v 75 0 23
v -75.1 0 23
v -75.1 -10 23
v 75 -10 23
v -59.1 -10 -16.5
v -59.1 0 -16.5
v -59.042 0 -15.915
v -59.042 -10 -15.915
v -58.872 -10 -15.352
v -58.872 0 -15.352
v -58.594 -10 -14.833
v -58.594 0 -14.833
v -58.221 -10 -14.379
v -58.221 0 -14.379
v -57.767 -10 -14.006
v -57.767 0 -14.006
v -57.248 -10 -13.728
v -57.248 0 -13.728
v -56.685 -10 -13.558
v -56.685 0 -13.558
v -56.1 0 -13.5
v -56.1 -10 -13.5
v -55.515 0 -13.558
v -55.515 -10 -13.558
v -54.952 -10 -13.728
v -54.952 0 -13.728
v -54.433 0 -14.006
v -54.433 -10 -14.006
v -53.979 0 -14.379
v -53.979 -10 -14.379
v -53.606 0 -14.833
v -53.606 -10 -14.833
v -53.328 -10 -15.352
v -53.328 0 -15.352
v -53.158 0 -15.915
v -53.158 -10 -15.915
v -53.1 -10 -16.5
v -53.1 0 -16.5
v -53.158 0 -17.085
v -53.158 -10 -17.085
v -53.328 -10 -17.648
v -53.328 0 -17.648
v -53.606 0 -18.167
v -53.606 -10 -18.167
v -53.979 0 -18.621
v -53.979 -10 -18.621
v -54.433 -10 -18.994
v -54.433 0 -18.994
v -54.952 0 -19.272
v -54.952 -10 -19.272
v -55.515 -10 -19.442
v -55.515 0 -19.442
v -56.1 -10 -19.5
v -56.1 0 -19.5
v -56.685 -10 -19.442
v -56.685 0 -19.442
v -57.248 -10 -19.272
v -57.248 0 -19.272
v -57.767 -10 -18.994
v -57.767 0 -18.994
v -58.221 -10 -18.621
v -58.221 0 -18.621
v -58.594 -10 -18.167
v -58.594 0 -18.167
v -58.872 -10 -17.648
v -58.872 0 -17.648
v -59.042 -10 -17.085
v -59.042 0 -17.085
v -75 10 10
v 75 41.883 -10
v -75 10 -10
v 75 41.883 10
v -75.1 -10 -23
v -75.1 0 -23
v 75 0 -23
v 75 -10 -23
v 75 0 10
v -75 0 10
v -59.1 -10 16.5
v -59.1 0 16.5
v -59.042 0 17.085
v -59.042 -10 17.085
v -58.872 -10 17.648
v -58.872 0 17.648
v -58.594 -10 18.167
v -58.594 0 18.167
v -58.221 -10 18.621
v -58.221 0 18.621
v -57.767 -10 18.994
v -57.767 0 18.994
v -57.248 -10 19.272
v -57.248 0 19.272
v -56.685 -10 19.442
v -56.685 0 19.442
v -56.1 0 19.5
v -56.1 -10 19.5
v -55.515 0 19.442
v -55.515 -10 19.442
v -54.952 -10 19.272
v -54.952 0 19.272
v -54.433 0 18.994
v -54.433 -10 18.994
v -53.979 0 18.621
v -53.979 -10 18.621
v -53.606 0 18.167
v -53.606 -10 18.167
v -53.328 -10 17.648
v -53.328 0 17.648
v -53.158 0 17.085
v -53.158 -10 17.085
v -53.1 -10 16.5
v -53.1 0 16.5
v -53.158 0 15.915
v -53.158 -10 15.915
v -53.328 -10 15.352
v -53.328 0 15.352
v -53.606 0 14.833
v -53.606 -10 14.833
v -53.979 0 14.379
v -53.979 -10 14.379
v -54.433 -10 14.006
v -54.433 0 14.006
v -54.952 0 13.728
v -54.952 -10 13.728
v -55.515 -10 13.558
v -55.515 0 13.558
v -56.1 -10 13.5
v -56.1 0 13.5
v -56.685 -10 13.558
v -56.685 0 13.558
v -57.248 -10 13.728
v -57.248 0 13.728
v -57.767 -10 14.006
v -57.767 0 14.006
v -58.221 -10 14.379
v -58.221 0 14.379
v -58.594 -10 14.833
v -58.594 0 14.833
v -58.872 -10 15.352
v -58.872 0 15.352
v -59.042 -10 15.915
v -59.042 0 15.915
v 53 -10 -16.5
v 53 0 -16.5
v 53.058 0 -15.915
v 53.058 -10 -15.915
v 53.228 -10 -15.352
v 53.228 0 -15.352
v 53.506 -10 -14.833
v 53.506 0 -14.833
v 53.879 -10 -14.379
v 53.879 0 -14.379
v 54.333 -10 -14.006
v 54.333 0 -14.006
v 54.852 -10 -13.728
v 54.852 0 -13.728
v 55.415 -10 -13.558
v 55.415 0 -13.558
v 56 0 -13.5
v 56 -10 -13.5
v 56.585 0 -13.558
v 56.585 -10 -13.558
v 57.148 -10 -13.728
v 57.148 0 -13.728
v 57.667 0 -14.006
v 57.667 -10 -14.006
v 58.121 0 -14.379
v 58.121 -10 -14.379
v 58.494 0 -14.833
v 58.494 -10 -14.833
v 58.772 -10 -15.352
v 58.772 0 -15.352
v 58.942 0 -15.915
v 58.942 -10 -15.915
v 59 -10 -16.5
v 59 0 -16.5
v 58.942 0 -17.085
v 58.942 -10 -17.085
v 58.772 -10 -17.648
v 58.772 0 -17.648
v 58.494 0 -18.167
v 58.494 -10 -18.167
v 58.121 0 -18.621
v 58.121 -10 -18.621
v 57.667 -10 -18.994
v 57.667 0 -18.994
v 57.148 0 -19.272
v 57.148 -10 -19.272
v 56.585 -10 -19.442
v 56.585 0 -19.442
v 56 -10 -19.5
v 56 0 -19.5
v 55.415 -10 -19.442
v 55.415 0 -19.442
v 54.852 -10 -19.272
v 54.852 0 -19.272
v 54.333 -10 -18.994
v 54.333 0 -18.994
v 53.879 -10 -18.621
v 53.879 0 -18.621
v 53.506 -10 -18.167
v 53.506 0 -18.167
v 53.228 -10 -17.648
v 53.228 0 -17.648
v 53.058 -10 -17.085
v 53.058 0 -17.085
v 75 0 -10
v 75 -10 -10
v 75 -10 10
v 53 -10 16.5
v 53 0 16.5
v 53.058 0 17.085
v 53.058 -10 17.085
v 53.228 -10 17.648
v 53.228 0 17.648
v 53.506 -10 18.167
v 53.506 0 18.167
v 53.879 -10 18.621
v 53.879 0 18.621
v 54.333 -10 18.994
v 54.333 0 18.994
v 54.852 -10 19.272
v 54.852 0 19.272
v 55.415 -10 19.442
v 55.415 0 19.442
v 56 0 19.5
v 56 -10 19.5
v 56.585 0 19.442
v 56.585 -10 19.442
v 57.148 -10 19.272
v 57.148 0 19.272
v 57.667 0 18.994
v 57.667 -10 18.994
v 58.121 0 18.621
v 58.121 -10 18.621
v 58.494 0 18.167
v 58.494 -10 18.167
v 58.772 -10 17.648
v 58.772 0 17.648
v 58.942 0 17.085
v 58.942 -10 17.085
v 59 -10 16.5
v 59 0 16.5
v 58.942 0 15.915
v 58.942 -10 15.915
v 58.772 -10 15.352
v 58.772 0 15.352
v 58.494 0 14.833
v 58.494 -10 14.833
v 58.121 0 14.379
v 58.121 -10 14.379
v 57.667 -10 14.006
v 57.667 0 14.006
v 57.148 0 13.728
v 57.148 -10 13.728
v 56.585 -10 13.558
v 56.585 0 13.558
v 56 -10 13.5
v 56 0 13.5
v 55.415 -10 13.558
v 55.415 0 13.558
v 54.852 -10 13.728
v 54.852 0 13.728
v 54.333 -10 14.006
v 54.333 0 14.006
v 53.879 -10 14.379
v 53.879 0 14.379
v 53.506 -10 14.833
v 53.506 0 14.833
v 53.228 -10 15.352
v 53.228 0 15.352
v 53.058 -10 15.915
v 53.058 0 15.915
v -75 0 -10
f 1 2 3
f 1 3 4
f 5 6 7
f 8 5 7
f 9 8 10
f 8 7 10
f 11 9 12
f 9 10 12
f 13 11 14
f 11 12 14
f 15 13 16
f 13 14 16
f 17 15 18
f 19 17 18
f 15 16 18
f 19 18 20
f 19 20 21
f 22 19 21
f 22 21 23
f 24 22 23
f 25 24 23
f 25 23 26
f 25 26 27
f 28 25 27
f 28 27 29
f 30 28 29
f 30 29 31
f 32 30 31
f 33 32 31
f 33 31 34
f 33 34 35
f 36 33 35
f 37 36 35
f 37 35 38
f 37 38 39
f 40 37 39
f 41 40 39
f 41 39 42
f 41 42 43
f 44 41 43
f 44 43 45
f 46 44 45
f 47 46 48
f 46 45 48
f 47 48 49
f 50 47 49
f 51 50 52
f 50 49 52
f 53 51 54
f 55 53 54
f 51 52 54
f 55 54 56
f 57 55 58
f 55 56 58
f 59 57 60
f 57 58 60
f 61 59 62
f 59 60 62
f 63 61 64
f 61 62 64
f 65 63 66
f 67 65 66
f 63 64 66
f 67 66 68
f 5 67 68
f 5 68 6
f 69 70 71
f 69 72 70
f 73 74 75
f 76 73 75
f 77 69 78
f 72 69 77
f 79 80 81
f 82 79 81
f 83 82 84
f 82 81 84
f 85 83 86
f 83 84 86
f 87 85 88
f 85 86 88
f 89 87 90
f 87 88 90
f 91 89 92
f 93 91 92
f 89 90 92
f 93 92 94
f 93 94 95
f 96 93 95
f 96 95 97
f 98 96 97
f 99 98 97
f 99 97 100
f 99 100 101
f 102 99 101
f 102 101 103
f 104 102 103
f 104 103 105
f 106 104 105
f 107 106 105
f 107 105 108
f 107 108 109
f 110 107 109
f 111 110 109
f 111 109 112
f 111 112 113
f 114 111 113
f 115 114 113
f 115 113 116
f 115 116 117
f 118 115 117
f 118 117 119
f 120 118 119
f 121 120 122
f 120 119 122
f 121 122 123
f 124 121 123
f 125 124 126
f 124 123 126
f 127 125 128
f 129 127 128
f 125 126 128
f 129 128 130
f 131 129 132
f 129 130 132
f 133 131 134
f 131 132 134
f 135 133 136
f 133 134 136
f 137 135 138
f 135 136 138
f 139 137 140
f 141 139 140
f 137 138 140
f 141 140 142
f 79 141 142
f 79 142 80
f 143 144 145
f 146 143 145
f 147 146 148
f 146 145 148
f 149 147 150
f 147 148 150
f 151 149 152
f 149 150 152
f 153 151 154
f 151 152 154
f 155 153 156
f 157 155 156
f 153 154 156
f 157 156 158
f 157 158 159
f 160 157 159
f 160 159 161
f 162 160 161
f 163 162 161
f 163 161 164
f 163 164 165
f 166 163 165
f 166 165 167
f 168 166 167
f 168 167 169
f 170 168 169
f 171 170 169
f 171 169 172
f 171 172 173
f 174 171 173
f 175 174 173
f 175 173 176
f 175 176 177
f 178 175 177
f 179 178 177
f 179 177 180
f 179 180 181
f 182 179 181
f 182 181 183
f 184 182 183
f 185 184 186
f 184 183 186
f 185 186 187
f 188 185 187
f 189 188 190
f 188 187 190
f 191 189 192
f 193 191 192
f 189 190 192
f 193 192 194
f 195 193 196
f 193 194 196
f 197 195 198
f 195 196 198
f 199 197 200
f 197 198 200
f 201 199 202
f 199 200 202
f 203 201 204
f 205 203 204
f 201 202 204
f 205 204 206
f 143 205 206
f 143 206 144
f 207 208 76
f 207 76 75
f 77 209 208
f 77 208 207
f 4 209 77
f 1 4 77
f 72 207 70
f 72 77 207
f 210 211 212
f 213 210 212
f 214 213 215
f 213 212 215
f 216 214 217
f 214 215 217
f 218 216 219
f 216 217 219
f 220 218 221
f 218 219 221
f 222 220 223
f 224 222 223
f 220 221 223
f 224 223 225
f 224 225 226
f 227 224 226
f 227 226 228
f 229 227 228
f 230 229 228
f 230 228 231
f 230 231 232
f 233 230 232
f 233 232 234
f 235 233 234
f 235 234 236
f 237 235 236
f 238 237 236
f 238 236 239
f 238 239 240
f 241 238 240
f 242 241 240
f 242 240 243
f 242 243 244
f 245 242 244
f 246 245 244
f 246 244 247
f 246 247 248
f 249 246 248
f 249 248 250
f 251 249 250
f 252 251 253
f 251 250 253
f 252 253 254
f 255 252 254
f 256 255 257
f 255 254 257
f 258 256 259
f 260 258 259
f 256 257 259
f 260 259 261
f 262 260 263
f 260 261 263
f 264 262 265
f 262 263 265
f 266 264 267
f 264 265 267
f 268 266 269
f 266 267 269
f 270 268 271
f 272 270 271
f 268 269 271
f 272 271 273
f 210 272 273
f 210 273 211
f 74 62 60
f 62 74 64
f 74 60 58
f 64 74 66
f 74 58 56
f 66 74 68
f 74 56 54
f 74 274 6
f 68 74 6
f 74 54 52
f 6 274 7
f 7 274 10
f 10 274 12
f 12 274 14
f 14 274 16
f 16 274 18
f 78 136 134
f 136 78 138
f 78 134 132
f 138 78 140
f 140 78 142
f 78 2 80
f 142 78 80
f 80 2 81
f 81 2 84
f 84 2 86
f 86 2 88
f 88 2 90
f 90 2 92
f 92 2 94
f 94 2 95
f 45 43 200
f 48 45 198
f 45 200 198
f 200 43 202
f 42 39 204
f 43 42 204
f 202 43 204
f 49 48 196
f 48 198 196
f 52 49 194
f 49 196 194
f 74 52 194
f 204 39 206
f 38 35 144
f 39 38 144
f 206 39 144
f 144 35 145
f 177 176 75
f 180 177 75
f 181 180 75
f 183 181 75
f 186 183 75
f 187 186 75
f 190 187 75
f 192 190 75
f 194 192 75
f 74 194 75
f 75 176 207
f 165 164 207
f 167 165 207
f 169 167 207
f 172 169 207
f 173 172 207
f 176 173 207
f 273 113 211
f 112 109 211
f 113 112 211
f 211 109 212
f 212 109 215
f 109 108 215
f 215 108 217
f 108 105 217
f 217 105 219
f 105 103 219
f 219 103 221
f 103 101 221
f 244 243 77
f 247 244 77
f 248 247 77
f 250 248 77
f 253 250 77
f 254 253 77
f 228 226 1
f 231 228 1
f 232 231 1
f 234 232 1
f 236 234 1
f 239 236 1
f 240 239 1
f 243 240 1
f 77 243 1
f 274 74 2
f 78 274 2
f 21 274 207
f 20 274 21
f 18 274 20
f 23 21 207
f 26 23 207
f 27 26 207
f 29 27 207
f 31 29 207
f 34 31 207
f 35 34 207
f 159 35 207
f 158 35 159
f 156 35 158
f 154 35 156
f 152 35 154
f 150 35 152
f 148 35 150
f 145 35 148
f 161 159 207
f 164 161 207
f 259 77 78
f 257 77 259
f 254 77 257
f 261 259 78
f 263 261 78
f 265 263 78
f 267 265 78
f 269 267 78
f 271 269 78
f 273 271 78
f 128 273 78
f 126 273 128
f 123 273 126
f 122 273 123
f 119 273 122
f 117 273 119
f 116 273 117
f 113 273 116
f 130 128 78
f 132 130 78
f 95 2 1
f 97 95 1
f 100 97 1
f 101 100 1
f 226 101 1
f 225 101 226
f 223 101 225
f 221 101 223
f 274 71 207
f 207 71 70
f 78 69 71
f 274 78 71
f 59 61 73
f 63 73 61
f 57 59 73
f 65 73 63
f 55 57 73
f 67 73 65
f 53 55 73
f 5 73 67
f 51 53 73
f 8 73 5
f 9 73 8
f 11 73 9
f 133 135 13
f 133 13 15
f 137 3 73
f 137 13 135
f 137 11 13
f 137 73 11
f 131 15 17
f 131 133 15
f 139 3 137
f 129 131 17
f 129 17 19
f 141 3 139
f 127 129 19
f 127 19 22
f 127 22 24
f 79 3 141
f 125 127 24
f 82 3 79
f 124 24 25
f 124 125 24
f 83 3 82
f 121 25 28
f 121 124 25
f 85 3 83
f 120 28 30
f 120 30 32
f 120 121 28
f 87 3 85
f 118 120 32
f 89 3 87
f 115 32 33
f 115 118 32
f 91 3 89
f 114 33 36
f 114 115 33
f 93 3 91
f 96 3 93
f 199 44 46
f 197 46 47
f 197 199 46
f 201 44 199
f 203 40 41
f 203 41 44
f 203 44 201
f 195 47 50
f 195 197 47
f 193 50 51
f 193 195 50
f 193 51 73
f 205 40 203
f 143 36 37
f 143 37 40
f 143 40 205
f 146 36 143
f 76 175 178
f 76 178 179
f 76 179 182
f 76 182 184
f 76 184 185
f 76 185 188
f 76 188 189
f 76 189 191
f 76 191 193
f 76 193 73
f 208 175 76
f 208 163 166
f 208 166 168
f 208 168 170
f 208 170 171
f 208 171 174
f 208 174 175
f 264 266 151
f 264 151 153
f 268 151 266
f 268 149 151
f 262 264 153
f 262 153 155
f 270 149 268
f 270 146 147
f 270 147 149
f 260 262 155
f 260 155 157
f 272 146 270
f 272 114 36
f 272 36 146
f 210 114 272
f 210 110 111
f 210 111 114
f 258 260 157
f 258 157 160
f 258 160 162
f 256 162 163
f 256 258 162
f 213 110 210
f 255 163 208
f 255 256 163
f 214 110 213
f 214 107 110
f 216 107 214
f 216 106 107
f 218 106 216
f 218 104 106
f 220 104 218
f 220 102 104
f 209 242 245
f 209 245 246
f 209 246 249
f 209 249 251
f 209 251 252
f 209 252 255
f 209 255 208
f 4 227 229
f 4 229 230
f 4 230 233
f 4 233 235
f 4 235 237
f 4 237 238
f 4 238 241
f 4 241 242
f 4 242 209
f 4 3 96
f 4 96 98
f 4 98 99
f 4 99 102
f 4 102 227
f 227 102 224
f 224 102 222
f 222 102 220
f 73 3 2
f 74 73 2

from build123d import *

# Parameters (mm, degrees)
SKETCH1_W           = 150
SKETCH1_H           = 20
BOSS_EXTRUDE1_DEPTH = 10
BOSS_EXTRUDE2_DEPTH = 10
SKETCH7_W           = 150.099930891
SKETCH7_H           = 10
BOSS_EXTRUDE3_DEPTH = 23
SKETCH8_R           = 3
CUT_EXTRUDE4_DEPTH  = 46


with BuildPart() as part:
    # Sketch1 → Boss-Extrude1 (new, symmetric)
    with BuildSketch(Plane(origin=(0, 0, 0), x_dir=(1, 0, 0), z_dir=(0, 1, 0))):
        Rectangle(SKETCH1_W, SKETCH1_H)
    extrude(amount=BOSS_EXTRUDE1_DEPTH, both=True)

    # Sketch2 → Boss-Extrude2 (add, symmetric)
    with BuildSketch(Plane.XY):
        Polygon((-75, 10), (75, 10), (75, 41.883484251), align=None)
    extrude(amount=BOSS_EXTRUDE2_DEPTH, both=True)

    # Sketch7 → Boss-Extrude3 (add, symmetric)
    with BuildSketch(Plane.XY):
        with Locations((-0.049965445, -5)):
            Rectangle(SKETCH7_W, SKETCH7_H)
    extrude(amount=BOSS_EXTRUDE3_DEPTH, both=True)

    # Sketch8 → Cut-Extrude4 (cut)
    with BuildSketch(Plane(origin=(0, 0, 10), x_dir=(1, 0, 0), z_dir=(0, 1, 0))):
        with Locations(Location((-56.099930891, 26.5, 0), (0, 0, 180))):
            Circle(SKETCH8_R)
        with Locations(Location((56, 26.5, 0), (0, 0, 180))):
            Circle(SKETCH8_R)
        with Locations(Location((56, -6.5, 0), (0, 0, 180))):
            Circle(SKETCH8_R)
        with Locations(Location((-56.099930891, -6.5, 0), (0, 0, 180))):
            Circle(SKETCH8_R)
    extrude(amount=-CUT_EXTRUDE4_DEPTH, mode=Mode.SUBTRACT)


solid = part.part
